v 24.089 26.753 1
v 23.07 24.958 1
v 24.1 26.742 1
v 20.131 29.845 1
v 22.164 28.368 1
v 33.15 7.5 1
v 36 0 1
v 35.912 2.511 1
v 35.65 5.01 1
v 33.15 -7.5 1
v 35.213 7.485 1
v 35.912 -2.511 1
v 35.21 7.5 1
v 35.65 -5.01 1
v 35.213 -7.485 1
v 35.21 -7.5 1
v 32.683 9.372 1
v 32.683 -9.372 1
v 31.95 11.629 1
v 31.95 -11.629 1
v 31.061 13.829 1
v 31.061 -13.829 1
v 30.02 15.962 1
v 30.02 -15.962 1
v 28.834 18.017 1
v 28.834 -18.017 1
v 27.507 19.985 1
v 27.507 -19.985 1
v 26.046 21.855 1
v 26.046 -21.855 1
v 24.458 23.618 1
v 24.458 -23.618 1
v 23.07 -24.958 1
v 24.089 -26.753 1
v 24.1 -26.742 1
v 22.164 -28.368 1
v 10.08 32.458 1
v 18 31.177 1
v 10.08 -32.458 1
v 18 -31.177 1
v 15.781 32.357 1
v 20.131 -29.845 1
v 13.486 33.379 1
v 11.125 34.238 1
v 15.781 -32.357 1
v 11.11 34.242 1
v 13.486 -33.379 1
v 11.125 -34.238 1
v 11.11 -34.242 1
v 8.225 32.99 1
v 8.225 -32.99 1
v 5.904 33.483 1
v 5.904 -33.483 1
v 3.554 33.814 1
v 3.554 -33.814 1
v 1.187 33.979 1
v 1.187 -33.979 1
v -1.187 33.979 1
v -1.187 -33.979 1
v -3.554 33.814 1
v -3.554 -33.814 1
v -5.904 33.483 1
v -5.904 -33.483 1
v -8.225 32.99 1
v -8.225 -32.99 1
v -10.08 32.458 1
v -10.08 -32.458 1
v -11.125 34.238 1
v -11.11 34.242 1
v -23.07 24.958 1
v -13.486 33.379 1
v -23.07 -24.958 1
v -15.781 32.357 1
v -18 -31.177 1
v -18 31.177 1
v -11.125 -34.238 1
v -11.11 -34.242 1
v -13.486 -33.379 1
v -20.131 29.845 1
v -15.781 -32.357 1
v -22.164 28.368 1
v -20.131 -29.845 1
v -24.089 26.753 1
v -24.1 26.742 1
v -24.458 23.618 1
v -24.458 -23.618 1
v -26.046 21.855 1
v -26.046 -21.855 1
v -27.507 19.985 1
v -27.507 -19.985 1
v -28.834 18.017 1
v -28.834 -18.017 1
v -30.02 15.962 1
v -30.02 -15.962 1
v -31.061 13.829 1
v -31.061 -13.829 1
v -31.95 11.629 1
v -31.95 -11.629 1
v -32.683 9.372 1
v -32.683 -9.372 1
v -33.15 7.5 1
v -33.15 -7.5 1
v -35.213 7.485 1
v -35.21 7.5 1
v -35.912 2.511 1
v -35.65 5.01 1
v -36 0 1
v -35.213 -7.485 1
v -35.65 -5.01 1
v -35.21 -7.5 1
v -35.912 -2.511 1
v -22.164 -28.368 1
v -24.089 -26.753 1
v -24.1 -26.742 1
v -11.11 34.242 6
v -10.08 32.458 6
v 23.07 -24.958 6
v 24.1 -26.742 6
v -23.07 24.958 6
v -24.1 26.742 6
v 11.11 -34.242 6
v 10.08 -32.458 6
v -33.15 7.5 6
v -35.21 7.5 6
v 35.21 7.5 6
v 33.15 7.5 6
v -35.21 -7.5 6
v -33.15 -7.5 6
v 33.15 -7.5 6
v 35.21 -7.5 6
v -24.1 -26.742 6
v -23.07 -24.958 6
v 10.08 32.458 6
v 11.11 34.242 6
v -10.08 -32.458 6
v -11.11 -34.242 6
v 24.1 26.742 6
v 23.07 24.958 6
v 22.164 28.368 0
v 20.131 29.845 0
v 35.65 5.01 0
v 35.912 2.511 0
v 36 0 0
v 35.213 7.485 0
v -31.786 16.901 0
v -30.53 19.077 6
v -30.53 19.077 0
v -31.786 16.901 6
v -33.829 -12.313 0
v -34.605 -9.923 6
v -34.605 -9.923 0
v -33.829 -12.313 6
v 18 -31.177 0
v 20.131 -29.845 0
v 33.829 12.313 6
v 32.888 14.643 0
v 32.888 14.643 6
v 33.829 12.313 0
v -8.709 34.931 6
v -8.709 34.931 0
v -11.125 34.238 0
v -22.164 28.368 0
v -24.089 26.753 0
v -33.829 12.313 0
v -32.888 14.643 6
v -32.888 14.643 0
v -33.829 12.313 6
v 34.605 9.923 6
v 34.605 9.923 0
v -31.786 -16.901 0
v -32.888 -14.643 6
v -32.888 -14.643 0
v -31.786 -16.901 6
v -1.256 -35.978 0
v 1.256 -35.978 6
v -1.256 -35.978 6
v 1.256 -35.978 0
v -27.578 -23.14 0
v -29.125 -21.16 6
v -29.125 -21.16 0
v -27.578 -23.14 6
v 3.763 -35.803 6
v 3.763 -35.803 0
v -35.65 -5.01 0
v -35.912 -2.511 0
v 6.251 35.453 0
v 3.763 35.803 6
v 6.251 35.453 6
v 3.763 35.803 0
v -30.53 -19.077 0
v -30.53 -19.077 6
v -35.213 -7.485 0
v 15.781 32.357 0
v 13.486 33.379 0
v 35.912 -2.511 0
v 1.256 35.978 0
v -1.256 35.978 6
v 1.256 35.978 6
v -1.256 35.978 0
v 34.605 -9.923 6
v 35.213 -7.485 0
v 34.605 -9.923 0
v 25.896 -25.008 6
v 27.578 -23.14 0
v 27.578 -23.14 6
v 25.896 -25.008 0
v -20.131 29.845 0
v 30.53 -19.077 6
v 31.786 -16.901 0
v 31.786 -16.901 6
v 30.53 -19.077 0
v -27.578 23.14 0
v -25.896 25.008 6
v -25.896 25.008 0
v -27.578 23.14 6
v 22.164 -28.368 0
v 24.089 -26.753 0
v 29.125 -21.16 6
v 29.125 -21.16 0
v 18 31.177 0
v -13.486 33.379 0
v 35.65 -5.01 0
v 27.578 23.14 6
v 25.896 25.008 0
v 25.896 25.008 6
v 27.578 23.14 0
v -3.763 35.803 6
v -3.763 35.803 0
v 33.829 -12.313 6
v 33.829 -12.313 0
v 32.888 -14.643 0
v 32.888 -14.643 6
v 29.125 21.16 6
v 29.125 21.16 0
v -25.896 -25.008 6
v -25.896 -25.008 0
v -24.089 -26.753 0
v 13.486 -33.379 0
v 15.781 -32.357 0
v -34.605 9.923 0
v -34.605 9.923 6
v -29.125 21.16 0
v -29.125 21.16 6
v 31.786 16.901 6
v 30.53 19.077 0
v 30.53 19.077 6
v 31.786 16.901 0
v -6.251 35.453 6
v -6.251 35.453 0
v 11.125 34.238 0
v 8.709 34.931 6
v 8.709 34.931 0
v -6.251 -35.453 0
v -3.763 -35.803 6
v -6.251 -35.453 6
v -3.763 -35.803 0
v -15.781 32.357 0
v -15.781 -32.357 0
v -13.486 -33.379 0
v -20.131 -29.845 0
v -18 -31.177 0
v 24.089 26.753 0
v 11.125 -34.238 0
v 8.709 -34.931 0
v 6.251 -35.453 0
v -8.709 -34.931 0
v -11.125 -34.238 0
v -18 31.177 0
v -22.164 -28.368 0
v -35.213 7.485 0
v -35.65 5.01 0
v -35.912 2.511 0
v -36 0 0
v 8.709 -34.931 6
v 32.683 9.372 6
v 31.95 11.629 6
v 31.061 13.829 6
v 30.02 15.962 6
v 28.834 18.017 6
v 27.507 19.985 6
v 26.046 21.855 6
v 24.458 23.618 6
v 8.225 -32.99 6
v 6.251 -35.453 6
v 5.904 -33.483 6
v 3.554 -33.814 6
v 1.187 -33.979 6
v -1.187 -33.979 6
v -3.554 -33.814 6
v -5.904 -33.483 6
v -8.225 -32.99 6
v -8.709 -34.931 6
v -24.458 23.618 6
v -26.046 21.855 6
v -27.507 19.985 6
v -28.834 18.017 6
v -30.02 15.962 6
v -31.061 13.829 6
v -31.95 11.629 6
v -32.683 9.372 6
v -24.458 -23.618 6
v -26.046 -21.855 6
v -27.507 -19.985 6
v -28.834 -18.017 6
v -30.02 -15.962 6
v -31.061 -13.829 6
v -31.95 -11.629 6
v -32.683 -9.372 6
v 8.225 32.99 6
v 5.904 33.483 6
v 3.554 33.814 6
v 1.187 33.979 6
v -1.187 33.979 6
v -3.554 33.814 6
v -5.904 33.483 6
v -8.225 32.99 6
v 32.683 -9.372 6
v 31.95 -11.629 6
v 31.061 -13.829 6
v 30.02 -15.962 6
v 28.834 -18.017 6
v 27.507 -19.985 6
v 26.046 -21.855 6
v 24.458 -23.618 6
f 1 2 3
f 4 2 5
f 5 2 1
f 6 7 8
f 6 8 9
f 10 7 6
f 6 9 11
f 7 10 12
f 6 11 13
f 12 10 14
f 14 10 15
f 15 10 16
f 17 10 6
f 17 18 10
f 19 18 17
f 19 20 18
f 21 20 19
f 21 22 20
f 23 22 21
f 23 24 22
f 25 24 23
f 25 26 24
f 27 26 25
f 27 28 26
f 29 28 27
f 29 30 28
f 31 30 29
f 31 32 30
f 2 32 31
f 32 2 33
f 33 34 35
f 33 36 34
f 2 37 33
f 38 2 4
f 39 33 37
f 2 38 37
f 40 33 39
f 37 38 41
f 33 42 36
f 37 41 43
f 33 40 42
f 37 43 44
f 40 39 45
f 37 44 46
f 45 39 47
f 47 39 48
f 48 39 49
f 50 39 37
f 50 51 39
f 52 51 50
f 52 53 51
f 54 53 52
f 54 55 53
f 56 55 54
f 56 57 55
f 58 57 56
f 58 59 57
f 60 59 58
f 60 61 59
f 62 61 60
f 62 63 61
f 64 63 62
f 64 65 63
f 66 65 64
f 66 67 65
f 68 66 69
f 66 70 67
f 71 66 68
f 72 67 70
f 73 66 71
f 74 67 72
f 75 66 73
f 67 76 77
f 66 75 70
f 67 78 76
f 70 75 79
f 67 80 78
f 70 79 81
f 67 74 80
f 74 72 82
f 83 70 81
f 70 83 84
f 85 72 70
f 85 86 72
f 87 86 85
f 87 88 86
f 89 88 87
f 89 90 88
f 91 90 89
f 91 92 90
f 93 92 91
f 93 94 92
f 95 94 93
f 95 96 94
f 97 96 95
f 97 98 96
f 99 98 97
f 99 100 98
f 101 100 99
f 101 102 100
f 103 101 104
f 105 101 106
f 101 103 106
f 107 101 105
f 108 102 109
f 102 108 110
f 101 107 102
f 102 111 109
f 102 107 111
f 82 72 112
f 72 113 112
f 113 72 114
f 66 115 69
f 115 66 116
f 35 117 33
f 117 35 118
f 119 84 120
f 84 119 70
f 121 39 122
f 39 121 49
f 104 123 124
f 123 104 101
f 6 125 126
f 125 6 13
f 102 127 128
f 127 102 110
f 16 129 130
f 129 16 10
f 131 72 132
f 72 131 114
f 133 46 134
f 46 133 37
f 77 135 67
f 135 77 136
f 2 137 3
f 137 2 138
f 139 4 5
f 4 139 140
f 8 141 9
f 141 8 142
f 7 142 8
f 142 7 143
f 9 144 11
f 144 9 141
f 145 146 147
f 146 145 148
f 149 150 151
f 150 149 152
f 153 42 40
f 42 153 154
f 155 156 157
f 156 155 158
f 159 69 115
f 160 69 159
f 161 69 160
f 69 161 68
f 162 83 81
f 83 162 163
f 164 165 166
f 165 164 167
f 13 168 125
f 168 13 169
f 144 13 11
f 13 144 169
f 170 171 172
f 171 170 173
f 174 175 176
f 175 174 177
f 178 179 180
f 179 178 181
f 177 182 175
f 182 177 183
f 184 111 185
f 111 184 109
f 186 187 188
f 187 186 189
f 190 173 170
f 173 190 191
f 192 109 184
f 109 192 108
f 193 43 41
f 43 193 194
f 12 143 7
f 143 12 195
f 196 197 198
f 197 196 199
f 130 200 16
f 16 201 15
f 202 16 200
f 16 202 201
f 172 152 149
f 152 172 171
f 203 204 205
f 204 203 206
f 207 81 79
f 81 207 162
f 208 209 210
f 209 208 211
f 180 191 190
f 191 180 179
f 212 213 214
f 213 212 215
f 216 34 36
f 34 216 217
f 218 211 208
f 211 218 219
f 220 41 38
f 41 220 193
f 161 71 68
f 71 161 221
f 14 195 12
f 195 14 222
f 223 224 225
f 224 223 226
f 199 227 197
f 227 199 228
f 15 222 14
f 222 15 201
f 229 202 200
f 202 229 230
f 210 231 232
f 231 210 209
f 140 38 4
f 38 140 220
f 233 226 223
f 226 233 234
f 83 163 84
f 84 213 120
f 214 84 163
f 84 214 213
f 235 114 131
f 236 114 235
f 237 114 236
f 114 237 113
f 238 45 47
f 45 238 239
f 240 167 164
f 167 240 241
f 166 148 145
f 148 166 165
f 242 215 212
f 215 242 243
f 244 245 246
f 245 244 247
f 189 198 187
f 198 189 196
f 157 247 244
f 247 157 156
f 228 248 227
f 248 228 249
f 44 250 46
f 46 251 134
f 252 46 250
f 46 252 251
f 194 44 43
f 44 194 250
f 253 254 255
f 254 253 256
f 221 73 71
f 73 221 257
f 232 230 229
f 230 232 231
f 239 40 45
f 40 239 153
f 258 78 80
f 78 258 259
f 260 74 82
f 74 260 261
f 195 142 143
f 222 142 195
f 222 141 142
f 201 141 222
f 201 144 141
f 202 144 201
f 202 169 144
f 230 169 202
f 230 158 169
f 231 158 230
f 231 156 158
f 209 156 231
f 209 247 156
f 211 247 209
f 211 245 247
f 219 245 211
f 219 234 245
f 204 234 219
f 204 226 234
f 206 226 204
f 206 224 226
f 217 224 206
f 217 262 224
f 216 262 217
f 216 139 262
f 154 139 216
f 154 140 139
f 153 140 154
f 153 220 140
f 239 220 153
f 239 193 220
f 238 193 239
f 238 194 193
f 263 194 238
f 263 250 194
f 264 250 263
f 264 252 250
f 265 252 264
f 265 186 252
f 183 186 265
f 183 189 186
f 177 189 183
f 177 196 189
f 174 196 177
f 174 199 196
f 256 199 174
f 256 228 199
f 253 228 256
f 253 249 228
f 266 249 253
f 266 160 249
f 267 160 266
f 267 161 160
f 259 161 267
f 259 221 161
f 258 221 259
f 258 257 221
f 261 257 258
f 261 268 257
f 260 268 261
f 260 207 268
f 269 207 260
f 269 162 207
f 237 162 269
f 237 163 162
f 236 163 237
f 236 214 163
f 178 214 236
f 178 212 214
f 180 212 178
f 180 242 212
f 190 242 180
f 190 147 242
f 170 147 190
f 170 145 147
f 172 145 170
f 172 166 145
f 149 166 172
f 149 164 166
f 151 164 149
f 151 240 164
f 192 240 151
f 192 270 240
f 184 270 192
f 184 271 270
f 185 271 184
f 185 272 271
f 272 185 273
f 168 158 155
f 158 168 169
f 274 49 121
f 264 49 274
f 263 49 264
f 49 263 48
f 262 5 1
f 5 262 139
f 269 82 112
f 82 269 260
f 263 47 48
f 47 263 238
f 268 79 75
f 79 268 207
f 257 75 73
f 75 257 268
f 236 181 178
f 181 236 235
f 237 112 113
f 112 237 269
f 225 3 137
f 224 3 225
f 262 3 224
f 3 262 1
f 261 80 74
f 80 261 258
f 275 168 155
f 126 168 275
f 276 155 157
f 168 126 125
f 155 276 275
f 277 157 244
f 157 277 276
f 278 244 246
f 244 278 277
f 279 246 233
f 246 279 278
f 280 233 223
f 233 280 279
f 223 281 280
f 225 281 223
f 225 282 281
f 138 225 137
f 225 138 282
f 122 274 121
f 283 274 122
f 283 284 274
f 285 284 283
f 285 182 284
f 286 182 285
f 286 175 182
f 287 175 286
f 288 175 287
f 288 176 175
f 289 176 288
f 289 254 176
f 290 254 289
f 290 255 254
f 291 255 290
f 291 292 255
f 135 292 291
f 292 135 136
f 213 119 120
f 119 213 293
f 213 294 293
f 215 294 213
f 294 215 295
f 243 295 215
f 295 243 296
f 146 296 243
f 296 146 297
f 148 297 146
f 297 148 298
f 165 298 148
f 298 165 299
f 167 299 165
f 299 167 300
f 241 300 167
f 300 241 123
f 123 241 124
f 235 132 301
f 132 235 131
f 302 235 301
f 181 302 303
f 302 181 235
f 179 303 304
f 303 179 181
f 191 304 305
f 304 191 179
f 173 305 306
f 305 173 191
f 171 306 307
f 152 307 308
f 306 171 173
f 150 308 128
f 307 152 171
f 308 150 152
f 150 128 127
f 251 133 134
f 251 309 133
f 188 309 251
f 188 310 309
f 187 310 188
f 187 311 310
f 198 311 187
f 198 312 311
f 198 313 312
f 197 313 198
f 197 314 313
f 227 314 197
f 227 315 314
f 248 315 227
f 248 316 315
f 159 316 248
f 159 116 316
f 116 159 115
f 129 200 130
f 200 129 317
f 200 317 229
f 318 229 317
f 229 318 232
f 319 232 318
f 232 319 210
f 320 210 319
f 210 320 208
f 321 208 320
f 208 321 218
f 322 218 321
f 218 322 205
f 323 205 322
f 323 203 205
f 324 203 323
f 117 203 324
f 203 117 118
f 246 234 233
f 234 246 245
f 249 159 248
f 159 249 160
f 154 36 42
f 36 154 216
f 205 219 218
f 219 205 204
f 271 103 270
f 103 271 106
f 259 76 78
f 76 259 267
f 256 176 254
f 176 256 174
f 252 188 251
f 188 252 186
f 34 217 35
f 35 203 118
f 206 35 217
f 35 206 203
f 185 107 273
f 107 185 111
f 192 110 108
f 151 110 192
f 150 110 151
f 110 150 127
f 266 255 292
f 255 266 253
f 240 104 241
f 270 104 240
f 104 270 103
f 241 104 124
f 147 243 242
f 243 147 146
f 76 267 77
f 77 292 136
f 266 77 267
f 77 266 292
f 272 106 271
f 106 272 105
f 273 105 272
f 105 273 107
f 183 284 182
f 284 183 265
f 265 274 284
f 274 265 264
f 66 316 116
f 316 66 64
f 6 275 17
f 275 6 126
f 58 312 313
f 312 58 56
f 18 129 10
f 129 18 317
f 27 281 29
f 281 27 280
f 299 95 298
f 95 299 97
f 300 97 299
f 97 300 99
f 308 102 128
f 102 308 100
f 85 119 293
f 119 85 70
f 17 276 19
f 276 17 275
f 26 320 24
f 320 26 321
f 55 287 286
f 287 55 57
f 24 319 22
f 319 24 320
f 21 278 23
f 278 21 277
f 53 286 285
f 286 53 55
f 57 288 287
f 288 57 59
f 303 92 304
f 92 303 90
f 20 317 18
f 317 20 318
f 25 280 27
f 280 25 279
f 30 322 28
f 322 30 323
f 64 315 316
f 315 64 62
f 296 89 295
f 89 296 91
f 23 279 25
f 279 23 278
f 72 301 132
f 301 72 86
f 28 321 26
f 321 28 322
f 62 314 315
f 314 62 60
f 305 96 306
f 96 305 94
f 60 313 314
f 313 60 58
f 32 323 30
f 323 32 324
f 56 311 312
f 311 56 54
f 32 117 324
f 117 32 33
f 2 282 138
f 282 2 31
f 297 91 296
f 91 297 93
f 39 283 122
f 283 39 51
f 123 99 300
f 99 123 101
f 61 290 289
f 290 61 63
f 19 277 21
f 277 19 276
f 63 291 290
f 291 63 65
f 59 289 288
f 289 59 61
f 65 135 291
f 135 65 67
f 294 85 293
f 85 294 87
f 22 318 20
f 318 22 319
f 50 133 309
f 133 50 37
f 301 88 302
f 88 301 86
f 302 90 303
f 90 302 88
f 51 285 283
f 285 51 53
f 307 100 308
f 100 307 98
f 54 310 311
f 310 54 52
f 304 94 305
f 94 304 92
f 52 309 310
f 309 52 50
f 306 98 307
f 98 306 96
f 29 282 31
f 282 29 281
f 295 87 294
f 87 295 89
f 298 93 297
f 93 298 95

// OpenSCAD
// Century: Spice Road Organizer
//
// by W. Craig Trader is dual-licensed under 
// Creative Commons Attribution-ShareAlike 3.0 Unported License and
// GNU Lesser GPL 3.0 or later.
//
// ----------------------------------------------------------------------------

include <MCAD/units.scad>;

// ----- Command Line Arguments -----------------------------------------------

PART = "other";     // Which part to output
VERBOSE = true;     // Set to true to see more data

// ----- Component measurements -----------------------------------------------

BOWL_DIAMETER = 68 * mm;
LIP_HEIGHT    =  5 * mm;
NOTCH_WIDTH   = 15 * mm;

FONT_NAME = "Liberation Serif:style=Italic";
FONT_SIZE = 11.0;

// ----- Assembly details -----------------------------------------------------

FILAMENT = 0.8 * mm; // Thickness of a line of filament

BOTTOM = 2 * mm;
LID    = 2 * mm;
OUTER  = 2.5 * FILAMENT;
INNER  = 2.5 * FILAMENT;
SPACE  = 1 * mm;

GAP = FILAMENT/4;
SEP = 2 * mm;
OVERLAP = 0.1 * mm; // Ensures that there are no vertical artifacts leftover

$fn=90;             // Fine-grained corners

// ----- Calculated Measurements ----------------------------------------------

INNER_DIAMETER = BOWL_DIAMETER;
OUTER_DIAMETER = INNER_DIAMETER + 2 * OUTER;

// ----- Sub-Components -------------------------------------------------------

module dummy() {
    cube([100,100,1]);
}

module label(message) {
    mirror( [0,1,0] )
        text( message, font=FONT_NAME, size=FONT_SIZE, halign="center", valign="center" );
}

// ----- Components -----------------------------------------------------------

module bowl_lid(name="", thin=false) {
    thickness = thin ? (LID/2) : LID;

    INNER_HEIGHT = LIP_HEIGHT;
    OUTER_HEIGHT = INNER_HEIGHT + thickness;
    
    notchx = OUTER_DIAMETER + 2*OVERLAP;
    notchy = NOTCH_WIDTH;
    
    difference() {
        cylinder( d=OUTER_DIAMETER, h=OUTER_HEIGHT );
        translate( [0,0,thickness] ) 
            cylinder( d1=INNER_DIAMETER, d2=INNER_DIAMETER, h=OUTER_HEIGHT );
        
        for (angle=[-60,0,60]) {
            rotate( [0,0,angle] )
                translate( [-notchx/2, -notchy/2, thickness] )
                    cube( [notchx,notchy,OUTER_HEIGHT] );
        }
        
        if (name != "" && !thin) {
#            linear_extrude( height=LID, center=true ) 
                label(name);
        }
    }
}

// ----- Plated arrangements for long prints ----------------------------------

module place( translation=[0,0,0], angle=0, hue="" ) {
	for (i = [0 : $children-1]) {
		translate( translation ) 
			rotate( a=angle ) 
				if ( hue != "" ) {
					color( hue ) children(i);
				} else {
					children(i);
				}
	}
}

module bowl_plate(thin=false) {
    dx = OUTER_DIAMETER + 5 * mm;
    dy = OUTER_DIAMETER + 5 * mm;
    
    place( [0*dx,0*dy,0], 0, "gray" ) bowl_lid( thin=thin );
    place( [1*dx,0*dy,0], 0, "gray" ) bowl_lid( thin=thin );
    place( [0*dx,1*dy,0], 0, "gray" ) bowl_lid( thin=thin );
    place( [1*dx,1*dy,0], 0, "gray" ) bowl_lid( thin=thin );
}

module bowl_plate_with_names() {
    dx = OUTER_DIAMETER + 5 * mm;
    dy = OUTER_DIAMETER + 5 * mm;
    
    place( [0*dx,0*dy,0], 0, "brown" ) bowl_lid("Cinnamon");
    place( [1*dx,0*dy,0], 0, "green" ) bowl_lid("Cardamon");
    place( [0*dx,1*dy,0], 0, "red" ) bowl_lid("Safran");
    place( [1*dx,1*dy,0], 0, "yellow" ) bowl_lid("Tumeric");
}

// ----- Render Logic for makefile --------------------------------------------

if (VERBOSE) {
	echo (Part=PART);
}

if (PART == "lid-thick") {
    bowl_lid();
} else if (PART == "lid-thin") {
    bowl_lid(thin=true);
} else if (PART == "lid-cinnamon") {
    bowl_lid("Cinnamon");
} else if (PART == "lid-cardamon") {
    bowl_lid("Cardamon");
} else if (PART == "lid-safran") {
    bowl_lid("Safran");
} else if (PART == "lid-tumeric") {
    bowl_lid("Tumeric");
} else if (PART == "named-plate") {
    bowl_plate_with_names();
} else if (PART == "thick-blank-plate") {
    bowl_plate();
} else if (PART == "thin-blank-plate") {
    bowl_plate(thin=true);
} else {
    bowl_lid(thin=true);
}
